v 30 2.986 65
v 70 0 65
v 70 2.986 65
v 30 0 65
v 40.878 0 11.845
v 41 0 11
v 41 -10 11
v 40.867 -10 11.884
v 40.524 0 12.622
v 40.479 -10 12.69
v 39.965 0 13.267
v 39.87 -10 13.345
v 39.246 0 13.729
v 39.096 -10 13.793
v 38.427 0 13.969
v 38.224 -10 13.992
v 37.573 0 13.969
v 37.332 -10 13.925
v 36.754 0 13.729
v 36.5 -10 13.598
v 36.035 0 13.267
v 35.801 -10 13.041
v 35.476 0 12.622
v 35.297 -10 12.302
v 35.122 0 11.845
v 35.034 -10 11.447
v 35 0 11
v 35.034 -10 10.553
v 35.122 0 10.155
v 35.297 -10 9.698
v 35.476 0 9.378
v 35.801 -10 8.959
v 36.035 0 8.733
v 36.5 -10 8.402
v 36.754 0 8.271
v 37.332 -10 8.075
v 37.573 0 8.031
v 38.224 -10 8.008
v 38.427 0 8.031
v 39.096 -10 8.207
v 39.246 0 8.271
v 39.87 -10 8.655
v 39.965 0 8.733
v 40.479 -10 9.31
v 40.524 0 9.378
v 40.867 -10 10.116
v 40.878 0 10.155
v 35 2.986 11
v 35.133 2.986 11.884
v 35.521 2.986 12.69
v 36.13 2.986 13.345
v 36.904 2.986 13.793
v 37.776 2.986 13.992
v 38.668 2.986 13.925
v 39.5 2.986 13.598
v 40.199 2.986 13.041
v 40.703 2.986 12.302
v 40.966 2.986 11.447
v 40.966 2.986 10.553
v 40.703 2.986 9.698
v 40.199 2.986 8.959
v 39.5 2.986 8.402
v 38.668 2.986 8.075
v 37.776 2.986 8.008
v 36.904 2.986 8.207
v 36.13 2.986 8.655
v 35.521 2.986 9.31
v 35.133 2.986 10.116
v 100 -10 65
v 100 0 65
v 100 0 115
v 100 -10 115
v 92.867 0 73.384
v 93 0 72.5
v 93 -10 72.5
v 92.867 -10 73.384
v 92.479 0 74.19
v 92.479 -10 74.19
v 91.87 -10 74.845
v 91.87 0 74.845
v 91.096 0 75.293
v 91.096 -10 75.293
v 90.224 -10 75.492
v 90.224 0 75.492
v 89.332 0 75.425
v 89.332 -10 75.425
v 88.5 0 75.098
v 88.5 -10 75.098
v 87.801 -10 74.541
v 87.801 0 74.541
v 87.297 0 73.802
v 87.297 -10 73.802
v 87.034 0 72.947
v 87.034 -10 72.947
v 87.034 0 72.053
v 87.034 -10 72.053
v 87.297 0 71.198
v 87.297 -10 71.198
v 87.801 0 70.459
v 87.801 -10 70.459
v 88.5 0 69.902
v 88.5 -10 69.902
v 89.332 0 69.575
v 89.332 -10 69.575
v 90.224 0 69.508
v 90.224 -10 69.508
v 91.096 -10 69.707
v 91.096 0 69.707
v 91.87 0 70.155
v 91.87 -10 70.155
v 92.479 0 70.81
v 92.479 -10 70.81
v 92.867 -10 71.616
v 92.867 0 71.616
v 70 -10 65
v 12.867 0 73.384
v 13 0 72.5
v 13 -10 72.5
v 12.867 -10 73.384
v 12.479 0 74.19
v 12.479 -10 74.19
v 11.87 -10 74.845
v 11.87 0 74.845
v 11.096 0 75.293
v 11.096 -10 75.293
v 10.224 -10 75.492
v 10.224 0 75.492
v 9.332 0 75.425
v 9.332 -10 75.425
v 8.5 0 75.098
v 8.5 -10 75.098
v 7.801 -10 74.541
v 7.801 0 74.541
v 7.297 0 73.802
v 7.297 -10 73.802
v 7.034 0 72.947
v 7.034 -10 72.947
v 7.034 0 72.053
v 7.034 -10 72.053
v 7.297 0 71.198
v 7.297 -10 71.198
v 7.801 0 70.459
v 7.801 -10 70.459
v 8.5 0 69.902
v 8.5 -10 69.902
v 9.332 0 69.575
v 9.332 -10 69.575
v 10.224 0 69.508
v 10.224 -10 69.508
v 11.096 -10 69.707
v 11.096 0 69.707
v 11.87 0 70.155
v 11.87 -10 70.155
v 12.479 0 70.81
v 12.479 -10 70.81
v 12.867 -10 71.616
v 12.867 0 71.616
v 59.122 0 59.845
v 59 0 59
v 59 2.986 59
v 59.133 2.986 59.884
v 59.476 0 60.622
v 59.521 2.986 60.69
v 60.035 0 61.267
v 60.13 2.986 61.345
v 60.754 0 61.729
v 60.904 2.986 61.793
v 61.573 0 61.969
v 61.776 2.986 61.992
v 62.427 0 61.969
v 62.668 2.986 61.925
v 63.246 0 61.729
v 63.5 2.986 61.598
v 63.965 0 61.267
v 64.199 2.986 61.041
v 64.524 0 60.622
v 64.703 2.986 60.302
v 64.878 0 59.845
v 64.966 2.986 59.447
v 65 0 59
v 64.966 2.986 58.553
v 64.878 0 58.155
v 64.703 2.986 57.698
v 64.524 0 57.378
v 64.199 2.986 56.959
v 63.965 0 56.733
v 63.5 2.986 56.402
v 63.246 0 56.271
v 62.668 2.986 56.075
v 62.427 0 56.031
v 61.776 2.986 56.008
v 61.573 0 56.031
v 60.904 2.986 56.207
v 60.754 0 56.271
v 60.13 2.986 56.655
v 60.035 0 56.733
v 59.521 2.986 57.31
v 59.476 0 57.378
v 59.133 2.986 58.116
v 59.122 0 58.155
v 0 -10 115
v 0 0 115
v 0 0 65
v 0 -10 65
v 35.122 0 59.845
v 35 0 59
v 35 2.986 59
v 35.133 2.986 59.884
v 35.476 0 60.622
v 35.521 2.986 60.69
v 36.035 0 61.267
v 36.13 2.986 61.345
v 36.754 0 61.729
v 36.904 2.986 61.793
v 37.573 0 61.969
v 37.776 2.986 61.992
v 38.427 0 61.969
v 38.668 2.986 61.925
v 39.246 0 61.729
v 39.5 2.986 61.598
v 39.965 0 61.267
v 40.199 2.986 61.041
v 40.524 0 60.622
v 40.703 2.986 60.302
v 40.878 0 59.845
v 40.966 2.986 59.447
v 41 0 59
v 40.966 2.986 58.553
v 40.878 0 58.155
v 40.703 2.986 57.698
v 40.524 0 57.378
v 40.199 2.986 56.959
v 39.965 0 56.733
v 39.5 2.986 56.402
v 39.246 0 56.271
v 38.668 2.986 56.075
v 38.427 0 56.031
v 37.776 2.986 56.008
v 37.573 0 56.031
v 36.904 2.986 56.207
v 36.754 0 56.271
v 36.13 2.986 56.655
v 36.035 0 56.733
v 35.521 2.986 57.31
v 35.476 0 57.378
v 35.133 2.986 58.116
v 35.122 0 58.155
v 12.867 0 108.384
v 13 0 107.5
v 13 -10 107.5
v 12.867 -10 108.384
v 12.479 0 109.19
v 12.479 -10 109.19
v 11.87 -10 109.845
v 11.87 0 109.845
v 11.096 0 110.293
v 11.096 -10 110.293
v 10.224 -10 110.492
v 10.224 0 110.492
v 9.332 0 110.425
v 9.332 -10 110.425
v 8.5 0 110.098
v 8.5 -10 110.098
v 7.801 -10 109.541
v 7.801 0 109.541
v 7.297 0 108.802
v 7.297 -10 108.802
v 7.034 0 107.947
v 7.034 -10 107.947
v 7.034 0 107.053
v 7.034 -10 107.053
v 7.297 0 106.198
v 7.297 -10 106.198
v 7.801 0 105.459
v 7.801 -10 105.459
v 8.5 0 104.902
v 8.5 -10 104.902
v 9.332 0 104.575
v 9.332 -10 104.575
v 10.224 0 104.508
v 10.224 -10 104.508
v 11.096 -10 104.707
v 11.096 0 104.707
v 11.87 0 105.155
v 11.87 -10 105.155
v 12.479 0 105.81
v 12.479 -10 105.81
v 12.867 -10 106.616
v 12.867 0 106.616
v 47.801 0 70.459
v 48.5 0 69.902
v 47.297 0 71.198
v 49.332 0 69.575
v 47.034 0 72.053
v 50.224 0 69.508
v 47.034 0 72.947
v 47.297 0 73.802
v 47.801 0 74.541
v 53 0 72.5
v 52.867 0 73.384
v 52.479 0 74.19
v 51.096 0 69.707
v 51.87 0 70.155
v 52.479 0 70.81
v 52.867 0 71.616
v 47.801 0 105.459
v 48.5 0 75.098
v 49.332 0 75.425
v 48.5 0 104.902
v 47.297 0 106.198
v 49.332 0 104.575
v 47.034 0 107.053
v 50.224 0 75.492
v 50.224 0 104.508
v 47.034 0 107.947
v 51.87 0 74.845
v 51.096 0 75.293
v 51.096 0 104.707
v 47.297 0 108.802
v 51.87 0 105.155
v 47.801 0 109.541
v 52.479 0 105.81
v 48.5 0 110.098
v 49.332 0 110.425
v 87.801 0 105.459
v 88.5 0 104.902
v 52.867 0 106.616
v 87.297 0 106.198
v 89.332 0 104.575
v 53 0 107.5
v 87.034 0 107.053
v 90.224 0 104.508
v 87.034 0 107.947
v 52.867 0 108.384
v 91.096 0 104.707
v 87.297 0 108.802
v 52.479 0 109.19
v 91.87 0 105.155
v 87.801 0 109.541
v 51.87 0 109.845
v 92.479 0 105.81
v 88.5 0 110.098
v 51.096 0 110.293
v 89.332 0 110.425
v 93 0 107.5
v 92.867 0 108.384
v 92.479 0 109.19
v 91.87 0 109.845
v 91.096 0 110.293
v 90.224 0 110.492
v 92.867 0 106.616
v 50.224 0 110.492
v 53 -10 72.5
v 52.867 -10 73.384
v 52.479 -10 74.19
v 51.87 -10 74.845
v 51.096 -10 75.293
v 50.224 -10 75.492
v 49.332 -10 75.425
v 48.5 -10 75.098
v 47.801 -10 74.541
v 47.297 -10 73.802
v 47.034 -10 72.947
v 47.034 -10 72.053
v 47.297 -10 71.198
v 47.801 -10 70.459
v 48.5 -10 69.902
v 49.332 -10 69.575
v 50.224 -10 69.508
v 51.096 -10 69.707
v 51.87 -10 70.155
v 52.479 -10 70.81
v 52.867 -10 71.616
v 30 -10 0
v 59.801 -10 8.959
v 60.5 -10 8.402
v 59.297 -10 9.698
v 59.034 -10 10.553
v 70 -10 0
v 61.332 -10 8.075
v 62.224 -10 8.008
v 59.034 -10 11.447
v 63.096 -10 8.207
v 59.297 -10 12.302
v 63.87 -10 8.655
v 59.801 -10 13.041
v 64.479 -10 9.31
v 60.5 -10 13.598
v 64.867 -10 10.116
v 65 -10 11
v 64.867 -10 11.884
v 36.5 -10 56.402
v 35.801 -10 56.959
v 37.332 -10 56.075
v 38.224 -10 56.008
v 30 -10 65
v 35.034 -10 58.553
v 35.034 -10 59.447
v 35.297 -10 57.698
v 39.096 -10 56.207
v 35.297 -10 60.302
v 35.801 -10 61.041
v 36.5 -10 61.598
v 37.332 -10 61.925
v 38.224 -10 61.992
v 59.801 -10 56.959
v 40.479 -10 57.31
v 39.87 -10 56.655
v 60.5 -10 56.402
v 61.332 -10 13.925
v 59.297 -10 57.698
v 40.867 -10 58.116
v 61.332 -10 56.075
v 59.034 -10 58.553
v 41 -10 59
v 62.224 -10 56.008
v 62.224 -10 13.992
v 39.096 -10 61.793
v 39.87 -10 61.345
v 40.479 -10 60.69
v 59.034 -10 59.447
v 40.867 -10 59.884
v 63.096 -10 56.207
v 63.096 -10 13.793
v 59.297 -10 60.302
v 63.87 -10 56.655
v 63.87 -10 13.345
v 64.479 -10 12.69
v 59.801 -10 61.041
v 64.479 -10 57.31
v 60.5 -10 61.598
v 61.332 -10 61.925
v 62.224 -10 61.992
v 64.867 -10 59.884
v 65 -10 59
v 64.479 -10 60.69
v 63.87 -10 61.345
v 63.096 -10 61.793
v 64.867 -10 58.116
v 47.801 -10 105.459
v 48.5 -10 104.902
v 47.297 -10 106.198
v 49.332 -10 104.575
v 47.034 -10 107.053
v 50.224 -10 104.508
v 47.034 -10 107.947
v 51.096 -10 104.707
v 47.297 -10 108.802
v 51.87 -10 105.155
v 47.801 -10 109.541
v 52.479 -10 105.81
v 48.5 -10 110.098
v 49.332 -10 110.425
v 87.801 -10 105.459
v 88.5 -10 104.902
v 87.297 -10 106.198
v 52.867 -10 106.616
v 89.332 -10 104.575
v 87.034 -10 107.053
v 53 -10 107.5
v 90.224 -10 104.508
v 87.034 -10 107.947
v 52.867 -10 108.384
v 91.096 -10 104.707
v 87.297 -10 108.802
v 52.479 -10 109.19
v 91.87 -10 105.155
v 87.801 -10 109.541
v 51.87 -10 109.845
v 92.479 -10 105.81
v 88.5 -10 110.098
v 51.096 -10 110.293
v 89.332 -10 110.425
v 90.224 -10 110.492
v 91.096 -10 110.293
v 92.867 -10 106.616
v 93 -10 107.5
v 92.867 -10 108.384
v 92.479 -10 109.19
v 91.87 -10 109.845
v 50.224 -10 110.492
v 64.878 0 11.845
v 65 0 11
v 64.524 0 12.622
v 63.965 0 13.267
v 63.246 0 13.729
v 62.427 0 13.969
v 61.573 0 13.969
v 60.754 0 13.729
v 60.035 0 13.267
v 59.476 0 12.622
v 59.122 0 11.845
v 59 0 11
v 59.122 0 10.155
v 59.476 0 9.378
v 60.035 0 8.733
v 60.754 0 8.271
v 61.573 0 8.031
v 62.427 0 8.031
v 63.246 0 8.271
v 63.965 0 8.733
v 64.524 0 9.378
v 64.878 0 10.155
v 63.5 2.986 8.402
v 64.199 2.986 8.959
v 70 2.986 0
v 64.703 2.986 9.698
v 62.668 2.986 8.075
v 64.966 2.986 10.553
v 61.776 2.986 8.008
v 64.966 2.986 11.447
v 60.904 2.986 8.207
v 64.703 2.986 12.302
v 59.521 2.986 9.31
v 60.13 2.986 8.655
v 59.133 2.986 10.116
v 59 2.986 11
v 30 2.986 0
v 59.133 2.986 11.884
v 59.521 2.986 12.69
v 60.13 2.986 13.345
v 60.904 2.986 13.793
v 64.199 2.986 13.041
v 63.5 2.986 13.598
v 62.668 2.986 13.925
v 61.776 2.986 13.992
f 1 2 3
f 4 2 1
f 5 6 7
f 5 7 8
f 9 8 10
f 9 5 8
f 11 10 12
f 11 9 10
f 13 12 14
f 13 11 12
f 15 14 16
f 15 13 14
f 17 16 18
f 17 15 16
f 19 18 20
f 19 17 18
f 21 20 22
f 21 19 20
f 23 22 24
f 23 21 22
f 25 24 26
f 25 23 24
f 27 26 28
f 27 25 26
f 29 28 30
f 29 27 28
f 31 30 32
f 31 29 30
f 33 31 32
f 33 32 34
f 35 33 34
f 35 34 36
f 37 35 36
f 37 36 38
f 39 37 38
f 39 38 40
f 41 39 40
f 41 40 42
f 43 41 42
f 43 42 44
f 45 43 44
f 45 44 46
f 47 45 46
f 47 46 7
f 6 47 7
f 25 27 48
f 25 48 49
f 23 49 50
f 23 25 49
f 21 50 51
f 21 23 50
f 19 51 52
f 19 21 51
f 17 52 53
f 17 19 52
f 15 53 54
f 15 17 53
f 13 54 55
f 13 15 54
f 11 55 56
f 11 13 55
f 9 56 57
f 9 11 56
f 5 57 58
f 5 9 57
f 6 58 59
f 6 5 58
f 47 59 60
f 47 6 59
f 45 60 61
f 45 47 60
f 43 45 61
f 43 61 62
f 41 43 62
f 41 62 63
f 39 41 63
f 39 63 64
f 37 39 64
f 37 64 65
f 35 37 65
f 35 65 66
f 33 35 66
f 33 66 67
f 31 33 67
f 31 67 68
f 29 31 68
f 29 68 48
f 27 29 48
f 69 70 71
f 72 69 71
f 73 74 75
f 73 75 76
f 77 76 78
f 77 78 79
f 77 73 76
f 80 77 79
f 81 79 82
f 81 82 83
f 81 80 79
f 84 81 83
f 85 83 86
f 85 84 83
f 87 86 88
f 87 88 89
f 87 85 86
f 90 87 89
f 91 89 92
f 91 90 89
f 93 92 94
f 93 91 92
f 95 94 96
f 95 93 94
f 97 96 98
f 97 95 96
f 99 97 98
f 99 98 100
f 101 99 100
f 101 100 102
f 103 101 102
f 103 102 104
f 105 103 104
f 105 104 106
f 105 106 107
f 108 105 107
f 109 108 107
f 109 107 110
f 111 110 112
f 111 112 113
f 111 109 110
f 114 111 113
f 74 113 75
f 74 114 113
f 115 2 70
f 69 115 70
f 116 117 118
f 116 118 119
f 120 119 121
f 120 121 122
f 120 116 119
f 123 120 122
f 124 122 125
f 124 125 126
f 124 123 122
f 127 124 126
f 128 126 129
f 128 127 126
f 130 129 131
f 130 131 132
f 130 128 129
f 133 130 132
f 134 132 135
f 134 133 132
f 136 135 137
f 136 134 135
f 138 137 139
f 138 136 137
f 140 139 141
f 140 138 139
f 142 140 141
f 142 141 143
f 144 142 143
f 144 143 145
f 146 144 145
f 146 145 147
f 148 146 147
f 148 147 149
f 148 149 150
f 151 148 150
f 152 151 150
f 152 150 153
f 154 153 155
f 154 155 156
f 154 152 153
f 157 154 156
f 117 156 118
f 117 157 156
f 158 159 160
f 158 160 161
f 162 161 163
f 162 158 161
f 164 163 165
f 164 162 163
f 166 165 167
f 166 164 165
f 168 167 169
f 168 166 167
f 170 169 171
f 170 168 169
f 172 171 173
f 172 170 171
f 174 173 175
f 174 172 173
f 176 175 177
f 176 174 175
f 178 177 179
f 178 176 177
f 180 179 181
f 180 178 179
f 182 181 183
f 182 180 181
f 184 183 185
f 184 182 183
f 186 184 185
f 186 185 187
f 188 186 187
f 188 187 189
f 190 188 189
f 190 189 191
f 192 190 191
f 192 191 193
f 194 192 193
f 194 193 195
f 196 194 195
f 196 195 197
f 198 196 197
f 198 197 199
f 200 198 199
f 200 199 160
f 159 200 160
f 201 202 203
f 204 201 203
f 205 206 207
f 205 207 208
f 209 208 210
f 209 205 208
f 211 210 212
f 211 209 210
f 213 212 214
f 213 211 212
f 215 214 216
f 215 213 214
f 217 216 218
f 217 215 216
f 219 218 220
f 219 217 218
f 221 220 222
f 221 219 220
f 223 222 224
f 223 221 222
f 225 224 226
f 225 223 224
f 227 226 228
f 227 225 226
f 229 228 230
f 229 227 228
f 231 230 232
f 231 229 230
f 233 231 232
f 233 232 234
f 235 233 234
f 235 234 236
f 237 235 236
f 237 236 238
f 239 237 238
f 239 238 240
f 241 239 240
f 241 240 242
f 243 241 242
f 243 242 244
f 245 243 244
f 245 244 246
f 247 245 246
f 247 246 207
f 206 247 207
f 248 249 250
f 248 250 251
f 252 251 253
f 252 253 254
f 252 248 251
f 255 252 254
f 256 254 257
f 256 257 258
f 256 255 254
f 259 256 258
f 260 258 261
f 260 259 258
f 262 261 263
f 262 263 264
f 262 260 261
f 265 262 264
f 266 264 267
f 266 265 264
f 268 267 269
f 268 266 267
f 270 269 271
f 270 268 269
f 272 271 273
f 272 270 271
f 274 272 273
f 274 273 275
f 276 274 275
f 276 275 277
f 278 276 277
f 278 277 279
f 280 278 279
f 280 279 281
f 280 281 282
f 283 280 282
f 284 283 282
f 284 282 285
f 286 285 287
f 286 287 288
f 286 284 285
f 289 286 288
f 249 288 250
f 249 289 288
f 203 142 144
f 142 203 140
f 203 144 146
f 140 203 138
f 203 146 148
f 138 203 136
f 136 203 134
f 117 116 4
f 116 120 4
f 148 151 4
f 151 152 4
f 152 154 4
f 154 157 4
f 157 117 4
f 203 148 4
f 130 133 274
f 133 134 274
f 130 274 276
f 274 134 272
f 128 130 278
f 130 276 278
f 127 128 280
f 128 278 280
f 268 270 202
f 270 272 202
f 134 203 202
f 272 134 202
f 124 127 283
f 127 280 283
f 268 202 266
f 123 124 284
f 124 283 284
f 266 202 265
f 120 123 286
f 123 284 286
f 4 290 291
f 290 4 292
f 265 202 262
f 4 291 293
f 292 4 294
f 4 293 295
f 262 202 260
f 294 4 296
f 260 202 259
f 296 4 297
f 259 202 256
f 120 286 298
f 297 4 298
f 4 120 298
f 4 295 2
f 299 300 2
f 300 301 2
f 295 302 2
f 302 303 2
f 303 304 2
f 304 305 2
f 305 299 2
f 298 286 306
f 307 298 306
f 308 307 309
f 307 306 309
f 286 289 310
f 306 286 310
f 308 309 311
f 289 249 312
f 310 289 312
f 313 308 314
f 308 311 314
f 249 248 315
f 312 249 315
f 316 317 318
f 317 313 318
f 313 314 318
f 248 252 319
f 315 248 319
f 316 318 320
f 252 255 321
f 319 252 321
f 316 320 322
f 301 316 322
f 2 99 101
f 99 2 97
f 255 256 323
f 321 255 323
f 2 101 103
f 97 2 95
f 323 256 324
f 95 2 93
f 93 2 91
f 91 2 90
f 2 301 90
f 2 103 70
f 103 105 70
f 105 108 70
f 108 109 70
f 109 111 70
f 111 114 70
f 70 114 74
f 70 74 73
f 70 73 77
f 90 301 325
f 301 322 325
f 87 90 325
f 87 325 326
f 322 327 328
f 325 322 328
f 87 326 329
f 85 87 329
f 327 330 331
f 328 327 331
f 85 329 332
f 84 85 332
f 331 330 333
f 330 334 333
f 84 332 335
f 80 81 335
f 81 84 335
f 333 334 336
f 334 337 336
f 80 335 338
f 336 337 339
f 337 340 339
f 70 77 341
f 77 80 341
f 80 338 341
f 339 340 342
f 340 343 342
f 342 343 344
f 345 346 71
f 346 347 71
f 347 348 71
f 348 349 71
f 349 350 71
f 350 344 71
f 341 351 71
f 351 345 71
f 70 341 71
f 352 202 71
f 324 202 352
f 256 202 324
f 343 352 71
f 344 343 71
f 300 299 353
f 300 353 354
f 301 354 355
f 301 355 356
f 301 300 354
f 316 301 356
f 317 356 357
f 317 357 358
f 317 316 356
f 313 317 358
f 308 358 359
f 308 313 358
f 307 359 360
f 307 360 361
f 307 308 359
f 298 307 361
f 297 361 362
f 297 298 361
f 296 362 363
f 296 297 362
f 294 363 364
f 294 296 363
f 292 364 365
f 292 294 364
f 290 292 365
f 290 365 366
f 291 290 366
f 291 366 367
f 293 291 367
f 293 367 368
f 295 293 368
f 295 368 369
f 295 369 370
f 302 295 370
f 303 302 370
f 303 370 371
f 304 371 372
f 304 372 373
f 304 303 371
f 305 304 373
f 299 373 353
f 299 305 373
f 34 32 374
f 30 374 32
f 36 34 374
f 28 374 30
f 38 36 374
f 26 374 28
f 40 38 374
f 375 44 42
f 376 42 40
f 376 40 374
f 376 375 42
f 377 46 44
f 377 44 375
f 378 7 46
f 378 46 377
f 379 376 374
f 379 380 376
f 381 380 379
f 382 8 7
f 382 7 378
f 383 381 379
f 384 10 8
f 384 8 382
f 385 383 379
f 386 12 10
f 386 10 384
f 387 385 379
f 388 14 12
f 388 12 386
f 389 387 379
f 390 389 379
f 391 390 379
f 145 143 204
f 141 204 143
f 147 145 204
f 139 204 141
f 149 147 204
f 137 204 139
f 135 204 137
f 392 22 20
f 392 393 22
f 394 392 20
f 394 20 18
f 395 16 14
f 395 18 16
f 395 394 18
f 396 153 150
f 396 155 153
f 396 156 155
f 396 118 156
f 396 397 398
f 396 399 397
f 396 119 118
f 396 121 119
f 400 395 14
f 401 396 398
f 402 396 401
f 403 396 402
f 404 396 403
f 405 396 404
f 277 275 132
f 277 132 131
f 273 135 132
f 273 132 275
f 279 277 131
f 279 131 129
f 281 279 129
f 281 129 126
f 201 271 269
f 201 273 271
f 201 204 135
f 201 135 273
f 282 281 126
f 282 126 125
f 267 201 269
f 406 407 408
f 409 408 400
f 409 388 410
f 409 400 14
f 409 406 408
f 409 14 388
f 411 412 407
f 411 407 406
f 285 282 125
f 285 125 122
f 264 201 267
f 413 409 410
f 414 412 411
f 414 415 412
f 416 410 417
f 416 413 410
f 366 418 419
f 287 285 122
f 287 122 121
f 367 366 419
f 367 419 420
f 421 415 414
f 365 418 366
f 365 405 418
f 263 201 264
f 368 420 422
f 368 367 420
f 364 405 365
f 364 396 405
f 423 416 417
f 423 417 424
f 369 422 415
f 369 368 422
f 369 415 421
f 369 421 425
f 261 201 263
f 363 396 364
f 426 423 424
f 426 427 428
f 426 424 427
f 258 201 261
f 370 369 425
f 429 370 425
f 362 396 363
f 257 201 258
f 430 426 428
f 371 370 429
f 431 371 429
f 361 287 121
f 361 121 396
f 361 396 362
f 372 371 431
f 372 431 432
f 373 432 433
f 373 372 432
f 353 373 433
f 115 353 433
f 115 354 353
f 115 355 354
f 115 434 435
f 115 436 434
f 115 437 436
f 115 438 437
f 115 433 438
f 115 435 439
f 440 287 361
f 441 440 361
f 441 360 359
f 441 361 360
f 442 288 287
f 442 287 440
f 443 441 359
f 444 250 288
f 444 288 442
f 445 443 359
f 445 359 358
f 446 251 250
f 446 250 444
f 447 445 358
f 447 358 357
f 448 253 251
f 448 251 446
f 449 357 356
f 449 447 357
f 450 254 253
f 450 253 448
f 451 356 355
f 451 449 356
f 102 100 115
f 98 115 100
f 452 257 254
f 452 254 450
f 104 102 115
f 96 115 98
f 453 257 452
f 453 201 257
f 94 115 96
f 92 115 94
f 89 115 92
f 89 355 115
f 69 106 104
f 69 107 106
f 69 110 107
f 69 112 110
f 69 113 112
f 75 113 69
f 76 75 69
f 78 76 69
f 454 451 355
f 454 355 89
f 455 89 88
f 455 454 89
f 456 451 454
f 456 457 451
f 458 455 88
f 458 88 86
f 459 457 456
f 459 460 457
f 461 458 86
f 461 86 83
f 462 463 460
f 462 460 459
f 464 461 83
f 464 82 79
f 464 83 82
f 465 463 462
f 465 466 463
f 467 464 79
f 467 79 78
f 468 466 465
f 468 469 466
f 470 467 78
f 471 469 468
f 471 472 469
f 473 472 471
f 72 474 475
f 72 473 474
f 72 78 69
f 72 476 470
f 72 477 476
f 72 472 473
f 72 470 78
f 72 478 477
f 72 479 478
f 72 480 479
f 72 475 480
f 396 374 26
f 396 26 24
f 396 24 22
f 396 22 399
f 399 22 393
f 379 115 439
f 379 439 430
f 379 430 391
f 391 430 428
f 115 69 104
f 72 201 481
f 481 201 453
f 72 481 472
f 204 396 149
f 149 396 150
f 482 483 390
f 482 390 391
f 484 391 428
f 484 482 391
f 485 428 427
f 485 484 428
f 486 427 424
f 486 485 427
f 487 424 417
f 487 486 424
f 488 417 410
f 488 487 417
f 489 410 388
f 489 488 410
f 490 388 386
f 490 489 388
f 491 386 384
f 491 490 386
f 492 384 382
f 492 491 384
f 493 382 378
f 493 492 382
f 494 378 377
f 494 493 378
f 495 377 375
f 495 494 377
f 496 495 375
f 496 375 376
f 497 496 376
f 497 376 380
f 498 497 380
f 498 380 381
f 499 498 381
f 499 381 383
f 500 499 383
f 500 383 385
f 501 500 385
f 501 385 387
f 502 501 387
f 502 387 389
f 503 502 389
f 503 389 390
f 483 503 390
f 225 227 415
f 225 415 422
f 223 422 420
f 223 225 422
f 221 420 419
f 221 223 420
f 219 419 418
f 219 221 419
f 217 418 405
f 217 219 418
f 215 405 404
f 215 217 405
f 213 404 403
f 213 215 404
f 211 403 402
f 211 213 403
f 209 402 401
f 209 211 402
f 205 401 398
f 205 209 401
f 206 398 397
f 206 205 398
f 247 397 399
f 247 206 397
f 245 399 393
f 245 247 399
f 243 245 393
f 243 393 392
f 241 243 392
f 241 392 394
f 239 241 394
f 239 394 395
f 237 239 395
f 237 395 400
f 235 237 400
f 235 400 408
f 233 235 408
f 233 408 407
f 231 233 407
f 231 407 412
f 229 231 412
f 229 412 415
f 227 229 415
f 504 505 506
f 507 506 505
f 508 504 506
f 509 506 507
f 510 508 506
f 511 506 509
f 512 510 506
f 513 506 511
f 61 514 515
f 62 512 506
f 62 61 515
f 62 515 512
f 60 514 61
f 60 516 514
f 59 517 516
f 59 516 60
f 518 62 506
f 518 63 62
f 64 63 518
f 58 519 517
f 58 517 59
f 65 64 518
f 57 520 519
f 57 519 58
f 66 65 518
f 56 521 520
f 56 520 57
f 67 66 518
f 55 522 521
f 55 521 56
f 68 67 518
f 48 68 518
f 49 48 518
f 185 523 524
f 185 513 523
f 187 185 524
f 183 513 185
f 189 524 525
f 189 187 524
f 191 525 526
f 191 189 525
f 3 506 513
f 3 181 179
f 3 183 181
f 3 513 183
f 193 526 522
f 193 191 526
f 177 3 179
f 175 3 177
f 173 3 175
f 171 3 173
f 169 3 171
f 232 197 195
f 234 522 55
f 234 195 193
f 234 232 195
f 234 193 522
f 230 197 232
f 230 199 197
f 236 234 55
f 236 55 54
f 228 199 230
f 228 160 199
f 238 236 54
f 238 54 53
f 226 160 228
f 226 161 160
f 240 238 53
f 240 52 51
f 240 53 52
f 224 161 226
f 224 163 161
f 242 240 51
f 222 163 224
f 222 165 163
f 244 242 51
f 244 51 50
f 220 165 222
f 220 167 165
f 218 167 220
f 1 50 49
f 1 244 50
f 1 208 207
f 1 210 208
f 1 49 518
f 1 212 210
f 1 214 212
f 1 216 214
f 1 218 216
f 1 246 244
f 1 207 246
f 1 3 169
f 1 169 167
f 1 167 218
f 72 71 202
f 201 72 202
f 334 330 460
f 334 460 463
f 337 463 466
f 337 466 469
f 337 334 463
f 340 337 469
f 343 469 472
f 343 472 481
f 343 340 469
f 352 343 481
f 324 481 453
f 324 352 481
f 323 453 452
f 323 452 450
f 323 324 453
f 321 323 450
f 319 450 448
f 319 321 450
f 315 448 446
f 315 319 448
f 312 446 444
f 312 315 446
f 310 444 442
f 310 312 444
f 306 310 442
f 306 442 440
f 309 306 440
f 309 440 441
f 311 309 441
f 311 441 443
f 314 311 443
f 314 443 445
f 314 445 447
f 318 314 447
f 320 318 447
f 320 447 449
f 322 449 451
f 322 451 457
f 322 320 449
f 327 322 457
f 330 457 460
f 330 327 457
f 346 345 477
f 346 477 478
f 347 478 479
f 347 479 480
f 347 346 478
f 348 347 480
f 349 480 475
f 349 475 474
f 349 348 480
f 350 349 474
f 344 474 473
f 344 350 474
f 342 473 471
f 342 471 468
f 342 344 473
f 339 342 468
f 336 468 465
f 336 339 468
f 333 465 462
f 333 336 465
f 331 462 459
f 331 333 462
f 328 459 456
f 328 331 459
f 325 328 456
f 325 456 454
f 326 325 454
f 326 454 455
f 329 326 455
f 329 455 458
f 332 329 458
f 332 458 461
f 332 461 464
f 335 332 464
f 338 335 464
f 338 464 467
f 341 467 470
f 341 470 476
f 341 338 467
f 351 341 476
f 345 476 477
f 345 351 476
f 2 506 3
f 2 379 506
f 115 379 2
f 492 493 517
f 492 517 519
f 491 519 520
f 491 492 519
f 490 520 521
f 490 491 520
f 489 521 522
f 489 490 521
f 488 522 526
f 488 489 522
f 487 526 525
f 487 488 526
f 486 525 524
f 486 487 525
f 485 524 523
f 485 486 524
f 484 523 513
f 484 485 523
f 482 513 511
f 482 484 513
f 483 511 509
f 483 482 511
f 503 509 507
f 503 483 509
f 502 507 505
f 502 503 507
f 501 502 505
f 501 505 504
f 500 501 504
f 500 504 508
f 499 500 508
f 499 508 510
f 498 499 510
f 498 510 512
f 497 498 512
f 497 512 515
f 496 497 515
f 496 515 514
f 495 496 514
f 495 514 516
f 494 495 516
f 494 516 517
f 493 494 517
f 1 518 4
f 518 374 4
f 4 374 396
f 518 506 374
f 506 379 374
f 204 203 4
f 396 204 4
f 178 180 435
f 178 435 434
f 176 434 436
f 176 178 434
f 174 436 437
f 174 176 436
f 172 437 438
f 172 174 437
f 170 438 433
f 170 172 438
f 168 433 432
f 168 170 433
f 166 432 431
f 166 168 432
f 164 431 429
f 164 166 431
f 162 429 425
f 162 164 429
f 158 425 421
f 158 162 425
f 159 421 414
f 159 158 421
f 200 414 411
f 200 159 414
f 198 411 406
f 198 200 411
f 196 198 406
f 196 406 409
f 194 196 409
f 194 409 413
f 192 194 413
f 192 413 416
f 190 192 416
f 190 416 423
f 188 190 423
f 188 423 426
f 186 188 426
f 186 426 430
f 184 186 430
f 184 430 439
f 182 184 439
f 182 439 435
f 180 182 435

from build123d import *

# Parameters (mm, degrees)
F0_R     = 3
F1_DEPTH = 10
F2_W     = 40
F2_H     = 65
F2_R     = 3
F3_DEPTH = 2.986


with BuildPart() as f1:
    # F0 (on Front) → F1 (new body)
    with BuildSketch(Plane.XZ):
        Polygon((30, 65), (30, 0), (70, 0), (70, 65), (100, 65), (100, 115), (0, 115), (0, 65), align=None)
        with Locations((38, 11)):
            Circle(F0_R, mode=Mode.SUBTRACT)
        with Locations((62, 11)):
            Circle(F0_R, mode=Mode.SUBTRACT)
        with Locations((10, 72.5)):
            Circle(F0_R, mode=Mode.SUBTRACT)
        with Locations((38, 59)):
            Circle(F0_R, mode=Mode.SUBTRACT)
        with Locations((10, 107.5)):
            Circle(F0_R, mode=Mode.SUBTRACT)
        with Locations((62, 59)):
            Circle(F0_R, mode=Mode.SUBTRACT)
        with Locations((50, 72.5)):
            Circle(F0_R, mode=Mode.SUBTRACT)
        with Locations((90, 72.5)):
            Circle(F0_R, mode=Mode.SUBTRACT)
        with Locations((50, 107.5)):
            Circle(F0_R, mode=Mode.SUBTRACT)
        with Locations((90, 107.5)):
            Circle(F0_R, mode=Mode.SUBTRACT)
    extrude(amount=F1_DEPTH)

    # F2 (on face) → F3 (join)
    with BuildSketch(Plane(origin=(0, 0, 0), x_dir=(-1, 0, 0), z_dir=(0, 1, 0))):
        with Locations((-50, 32.5)):
            Rectangle(F2_W, F2_H)
        with Locations((-62, 11)):
            Circle(F2_R, mode=Mode.SUBTRACT)
        with Locations((-38, 11)):
            Circle(F2_R, mode=Mode.SUBTRACT)
        with Locations((-62, 59)):
            Circle(F2_R, mode=Mode.SUBTRACT)
        with Locations((-38, 59)):
            Circle(F2_R, mode=Mode.SUBTRACT)
    extrude(amount=F3_DEPTH)


solid = f1.part
